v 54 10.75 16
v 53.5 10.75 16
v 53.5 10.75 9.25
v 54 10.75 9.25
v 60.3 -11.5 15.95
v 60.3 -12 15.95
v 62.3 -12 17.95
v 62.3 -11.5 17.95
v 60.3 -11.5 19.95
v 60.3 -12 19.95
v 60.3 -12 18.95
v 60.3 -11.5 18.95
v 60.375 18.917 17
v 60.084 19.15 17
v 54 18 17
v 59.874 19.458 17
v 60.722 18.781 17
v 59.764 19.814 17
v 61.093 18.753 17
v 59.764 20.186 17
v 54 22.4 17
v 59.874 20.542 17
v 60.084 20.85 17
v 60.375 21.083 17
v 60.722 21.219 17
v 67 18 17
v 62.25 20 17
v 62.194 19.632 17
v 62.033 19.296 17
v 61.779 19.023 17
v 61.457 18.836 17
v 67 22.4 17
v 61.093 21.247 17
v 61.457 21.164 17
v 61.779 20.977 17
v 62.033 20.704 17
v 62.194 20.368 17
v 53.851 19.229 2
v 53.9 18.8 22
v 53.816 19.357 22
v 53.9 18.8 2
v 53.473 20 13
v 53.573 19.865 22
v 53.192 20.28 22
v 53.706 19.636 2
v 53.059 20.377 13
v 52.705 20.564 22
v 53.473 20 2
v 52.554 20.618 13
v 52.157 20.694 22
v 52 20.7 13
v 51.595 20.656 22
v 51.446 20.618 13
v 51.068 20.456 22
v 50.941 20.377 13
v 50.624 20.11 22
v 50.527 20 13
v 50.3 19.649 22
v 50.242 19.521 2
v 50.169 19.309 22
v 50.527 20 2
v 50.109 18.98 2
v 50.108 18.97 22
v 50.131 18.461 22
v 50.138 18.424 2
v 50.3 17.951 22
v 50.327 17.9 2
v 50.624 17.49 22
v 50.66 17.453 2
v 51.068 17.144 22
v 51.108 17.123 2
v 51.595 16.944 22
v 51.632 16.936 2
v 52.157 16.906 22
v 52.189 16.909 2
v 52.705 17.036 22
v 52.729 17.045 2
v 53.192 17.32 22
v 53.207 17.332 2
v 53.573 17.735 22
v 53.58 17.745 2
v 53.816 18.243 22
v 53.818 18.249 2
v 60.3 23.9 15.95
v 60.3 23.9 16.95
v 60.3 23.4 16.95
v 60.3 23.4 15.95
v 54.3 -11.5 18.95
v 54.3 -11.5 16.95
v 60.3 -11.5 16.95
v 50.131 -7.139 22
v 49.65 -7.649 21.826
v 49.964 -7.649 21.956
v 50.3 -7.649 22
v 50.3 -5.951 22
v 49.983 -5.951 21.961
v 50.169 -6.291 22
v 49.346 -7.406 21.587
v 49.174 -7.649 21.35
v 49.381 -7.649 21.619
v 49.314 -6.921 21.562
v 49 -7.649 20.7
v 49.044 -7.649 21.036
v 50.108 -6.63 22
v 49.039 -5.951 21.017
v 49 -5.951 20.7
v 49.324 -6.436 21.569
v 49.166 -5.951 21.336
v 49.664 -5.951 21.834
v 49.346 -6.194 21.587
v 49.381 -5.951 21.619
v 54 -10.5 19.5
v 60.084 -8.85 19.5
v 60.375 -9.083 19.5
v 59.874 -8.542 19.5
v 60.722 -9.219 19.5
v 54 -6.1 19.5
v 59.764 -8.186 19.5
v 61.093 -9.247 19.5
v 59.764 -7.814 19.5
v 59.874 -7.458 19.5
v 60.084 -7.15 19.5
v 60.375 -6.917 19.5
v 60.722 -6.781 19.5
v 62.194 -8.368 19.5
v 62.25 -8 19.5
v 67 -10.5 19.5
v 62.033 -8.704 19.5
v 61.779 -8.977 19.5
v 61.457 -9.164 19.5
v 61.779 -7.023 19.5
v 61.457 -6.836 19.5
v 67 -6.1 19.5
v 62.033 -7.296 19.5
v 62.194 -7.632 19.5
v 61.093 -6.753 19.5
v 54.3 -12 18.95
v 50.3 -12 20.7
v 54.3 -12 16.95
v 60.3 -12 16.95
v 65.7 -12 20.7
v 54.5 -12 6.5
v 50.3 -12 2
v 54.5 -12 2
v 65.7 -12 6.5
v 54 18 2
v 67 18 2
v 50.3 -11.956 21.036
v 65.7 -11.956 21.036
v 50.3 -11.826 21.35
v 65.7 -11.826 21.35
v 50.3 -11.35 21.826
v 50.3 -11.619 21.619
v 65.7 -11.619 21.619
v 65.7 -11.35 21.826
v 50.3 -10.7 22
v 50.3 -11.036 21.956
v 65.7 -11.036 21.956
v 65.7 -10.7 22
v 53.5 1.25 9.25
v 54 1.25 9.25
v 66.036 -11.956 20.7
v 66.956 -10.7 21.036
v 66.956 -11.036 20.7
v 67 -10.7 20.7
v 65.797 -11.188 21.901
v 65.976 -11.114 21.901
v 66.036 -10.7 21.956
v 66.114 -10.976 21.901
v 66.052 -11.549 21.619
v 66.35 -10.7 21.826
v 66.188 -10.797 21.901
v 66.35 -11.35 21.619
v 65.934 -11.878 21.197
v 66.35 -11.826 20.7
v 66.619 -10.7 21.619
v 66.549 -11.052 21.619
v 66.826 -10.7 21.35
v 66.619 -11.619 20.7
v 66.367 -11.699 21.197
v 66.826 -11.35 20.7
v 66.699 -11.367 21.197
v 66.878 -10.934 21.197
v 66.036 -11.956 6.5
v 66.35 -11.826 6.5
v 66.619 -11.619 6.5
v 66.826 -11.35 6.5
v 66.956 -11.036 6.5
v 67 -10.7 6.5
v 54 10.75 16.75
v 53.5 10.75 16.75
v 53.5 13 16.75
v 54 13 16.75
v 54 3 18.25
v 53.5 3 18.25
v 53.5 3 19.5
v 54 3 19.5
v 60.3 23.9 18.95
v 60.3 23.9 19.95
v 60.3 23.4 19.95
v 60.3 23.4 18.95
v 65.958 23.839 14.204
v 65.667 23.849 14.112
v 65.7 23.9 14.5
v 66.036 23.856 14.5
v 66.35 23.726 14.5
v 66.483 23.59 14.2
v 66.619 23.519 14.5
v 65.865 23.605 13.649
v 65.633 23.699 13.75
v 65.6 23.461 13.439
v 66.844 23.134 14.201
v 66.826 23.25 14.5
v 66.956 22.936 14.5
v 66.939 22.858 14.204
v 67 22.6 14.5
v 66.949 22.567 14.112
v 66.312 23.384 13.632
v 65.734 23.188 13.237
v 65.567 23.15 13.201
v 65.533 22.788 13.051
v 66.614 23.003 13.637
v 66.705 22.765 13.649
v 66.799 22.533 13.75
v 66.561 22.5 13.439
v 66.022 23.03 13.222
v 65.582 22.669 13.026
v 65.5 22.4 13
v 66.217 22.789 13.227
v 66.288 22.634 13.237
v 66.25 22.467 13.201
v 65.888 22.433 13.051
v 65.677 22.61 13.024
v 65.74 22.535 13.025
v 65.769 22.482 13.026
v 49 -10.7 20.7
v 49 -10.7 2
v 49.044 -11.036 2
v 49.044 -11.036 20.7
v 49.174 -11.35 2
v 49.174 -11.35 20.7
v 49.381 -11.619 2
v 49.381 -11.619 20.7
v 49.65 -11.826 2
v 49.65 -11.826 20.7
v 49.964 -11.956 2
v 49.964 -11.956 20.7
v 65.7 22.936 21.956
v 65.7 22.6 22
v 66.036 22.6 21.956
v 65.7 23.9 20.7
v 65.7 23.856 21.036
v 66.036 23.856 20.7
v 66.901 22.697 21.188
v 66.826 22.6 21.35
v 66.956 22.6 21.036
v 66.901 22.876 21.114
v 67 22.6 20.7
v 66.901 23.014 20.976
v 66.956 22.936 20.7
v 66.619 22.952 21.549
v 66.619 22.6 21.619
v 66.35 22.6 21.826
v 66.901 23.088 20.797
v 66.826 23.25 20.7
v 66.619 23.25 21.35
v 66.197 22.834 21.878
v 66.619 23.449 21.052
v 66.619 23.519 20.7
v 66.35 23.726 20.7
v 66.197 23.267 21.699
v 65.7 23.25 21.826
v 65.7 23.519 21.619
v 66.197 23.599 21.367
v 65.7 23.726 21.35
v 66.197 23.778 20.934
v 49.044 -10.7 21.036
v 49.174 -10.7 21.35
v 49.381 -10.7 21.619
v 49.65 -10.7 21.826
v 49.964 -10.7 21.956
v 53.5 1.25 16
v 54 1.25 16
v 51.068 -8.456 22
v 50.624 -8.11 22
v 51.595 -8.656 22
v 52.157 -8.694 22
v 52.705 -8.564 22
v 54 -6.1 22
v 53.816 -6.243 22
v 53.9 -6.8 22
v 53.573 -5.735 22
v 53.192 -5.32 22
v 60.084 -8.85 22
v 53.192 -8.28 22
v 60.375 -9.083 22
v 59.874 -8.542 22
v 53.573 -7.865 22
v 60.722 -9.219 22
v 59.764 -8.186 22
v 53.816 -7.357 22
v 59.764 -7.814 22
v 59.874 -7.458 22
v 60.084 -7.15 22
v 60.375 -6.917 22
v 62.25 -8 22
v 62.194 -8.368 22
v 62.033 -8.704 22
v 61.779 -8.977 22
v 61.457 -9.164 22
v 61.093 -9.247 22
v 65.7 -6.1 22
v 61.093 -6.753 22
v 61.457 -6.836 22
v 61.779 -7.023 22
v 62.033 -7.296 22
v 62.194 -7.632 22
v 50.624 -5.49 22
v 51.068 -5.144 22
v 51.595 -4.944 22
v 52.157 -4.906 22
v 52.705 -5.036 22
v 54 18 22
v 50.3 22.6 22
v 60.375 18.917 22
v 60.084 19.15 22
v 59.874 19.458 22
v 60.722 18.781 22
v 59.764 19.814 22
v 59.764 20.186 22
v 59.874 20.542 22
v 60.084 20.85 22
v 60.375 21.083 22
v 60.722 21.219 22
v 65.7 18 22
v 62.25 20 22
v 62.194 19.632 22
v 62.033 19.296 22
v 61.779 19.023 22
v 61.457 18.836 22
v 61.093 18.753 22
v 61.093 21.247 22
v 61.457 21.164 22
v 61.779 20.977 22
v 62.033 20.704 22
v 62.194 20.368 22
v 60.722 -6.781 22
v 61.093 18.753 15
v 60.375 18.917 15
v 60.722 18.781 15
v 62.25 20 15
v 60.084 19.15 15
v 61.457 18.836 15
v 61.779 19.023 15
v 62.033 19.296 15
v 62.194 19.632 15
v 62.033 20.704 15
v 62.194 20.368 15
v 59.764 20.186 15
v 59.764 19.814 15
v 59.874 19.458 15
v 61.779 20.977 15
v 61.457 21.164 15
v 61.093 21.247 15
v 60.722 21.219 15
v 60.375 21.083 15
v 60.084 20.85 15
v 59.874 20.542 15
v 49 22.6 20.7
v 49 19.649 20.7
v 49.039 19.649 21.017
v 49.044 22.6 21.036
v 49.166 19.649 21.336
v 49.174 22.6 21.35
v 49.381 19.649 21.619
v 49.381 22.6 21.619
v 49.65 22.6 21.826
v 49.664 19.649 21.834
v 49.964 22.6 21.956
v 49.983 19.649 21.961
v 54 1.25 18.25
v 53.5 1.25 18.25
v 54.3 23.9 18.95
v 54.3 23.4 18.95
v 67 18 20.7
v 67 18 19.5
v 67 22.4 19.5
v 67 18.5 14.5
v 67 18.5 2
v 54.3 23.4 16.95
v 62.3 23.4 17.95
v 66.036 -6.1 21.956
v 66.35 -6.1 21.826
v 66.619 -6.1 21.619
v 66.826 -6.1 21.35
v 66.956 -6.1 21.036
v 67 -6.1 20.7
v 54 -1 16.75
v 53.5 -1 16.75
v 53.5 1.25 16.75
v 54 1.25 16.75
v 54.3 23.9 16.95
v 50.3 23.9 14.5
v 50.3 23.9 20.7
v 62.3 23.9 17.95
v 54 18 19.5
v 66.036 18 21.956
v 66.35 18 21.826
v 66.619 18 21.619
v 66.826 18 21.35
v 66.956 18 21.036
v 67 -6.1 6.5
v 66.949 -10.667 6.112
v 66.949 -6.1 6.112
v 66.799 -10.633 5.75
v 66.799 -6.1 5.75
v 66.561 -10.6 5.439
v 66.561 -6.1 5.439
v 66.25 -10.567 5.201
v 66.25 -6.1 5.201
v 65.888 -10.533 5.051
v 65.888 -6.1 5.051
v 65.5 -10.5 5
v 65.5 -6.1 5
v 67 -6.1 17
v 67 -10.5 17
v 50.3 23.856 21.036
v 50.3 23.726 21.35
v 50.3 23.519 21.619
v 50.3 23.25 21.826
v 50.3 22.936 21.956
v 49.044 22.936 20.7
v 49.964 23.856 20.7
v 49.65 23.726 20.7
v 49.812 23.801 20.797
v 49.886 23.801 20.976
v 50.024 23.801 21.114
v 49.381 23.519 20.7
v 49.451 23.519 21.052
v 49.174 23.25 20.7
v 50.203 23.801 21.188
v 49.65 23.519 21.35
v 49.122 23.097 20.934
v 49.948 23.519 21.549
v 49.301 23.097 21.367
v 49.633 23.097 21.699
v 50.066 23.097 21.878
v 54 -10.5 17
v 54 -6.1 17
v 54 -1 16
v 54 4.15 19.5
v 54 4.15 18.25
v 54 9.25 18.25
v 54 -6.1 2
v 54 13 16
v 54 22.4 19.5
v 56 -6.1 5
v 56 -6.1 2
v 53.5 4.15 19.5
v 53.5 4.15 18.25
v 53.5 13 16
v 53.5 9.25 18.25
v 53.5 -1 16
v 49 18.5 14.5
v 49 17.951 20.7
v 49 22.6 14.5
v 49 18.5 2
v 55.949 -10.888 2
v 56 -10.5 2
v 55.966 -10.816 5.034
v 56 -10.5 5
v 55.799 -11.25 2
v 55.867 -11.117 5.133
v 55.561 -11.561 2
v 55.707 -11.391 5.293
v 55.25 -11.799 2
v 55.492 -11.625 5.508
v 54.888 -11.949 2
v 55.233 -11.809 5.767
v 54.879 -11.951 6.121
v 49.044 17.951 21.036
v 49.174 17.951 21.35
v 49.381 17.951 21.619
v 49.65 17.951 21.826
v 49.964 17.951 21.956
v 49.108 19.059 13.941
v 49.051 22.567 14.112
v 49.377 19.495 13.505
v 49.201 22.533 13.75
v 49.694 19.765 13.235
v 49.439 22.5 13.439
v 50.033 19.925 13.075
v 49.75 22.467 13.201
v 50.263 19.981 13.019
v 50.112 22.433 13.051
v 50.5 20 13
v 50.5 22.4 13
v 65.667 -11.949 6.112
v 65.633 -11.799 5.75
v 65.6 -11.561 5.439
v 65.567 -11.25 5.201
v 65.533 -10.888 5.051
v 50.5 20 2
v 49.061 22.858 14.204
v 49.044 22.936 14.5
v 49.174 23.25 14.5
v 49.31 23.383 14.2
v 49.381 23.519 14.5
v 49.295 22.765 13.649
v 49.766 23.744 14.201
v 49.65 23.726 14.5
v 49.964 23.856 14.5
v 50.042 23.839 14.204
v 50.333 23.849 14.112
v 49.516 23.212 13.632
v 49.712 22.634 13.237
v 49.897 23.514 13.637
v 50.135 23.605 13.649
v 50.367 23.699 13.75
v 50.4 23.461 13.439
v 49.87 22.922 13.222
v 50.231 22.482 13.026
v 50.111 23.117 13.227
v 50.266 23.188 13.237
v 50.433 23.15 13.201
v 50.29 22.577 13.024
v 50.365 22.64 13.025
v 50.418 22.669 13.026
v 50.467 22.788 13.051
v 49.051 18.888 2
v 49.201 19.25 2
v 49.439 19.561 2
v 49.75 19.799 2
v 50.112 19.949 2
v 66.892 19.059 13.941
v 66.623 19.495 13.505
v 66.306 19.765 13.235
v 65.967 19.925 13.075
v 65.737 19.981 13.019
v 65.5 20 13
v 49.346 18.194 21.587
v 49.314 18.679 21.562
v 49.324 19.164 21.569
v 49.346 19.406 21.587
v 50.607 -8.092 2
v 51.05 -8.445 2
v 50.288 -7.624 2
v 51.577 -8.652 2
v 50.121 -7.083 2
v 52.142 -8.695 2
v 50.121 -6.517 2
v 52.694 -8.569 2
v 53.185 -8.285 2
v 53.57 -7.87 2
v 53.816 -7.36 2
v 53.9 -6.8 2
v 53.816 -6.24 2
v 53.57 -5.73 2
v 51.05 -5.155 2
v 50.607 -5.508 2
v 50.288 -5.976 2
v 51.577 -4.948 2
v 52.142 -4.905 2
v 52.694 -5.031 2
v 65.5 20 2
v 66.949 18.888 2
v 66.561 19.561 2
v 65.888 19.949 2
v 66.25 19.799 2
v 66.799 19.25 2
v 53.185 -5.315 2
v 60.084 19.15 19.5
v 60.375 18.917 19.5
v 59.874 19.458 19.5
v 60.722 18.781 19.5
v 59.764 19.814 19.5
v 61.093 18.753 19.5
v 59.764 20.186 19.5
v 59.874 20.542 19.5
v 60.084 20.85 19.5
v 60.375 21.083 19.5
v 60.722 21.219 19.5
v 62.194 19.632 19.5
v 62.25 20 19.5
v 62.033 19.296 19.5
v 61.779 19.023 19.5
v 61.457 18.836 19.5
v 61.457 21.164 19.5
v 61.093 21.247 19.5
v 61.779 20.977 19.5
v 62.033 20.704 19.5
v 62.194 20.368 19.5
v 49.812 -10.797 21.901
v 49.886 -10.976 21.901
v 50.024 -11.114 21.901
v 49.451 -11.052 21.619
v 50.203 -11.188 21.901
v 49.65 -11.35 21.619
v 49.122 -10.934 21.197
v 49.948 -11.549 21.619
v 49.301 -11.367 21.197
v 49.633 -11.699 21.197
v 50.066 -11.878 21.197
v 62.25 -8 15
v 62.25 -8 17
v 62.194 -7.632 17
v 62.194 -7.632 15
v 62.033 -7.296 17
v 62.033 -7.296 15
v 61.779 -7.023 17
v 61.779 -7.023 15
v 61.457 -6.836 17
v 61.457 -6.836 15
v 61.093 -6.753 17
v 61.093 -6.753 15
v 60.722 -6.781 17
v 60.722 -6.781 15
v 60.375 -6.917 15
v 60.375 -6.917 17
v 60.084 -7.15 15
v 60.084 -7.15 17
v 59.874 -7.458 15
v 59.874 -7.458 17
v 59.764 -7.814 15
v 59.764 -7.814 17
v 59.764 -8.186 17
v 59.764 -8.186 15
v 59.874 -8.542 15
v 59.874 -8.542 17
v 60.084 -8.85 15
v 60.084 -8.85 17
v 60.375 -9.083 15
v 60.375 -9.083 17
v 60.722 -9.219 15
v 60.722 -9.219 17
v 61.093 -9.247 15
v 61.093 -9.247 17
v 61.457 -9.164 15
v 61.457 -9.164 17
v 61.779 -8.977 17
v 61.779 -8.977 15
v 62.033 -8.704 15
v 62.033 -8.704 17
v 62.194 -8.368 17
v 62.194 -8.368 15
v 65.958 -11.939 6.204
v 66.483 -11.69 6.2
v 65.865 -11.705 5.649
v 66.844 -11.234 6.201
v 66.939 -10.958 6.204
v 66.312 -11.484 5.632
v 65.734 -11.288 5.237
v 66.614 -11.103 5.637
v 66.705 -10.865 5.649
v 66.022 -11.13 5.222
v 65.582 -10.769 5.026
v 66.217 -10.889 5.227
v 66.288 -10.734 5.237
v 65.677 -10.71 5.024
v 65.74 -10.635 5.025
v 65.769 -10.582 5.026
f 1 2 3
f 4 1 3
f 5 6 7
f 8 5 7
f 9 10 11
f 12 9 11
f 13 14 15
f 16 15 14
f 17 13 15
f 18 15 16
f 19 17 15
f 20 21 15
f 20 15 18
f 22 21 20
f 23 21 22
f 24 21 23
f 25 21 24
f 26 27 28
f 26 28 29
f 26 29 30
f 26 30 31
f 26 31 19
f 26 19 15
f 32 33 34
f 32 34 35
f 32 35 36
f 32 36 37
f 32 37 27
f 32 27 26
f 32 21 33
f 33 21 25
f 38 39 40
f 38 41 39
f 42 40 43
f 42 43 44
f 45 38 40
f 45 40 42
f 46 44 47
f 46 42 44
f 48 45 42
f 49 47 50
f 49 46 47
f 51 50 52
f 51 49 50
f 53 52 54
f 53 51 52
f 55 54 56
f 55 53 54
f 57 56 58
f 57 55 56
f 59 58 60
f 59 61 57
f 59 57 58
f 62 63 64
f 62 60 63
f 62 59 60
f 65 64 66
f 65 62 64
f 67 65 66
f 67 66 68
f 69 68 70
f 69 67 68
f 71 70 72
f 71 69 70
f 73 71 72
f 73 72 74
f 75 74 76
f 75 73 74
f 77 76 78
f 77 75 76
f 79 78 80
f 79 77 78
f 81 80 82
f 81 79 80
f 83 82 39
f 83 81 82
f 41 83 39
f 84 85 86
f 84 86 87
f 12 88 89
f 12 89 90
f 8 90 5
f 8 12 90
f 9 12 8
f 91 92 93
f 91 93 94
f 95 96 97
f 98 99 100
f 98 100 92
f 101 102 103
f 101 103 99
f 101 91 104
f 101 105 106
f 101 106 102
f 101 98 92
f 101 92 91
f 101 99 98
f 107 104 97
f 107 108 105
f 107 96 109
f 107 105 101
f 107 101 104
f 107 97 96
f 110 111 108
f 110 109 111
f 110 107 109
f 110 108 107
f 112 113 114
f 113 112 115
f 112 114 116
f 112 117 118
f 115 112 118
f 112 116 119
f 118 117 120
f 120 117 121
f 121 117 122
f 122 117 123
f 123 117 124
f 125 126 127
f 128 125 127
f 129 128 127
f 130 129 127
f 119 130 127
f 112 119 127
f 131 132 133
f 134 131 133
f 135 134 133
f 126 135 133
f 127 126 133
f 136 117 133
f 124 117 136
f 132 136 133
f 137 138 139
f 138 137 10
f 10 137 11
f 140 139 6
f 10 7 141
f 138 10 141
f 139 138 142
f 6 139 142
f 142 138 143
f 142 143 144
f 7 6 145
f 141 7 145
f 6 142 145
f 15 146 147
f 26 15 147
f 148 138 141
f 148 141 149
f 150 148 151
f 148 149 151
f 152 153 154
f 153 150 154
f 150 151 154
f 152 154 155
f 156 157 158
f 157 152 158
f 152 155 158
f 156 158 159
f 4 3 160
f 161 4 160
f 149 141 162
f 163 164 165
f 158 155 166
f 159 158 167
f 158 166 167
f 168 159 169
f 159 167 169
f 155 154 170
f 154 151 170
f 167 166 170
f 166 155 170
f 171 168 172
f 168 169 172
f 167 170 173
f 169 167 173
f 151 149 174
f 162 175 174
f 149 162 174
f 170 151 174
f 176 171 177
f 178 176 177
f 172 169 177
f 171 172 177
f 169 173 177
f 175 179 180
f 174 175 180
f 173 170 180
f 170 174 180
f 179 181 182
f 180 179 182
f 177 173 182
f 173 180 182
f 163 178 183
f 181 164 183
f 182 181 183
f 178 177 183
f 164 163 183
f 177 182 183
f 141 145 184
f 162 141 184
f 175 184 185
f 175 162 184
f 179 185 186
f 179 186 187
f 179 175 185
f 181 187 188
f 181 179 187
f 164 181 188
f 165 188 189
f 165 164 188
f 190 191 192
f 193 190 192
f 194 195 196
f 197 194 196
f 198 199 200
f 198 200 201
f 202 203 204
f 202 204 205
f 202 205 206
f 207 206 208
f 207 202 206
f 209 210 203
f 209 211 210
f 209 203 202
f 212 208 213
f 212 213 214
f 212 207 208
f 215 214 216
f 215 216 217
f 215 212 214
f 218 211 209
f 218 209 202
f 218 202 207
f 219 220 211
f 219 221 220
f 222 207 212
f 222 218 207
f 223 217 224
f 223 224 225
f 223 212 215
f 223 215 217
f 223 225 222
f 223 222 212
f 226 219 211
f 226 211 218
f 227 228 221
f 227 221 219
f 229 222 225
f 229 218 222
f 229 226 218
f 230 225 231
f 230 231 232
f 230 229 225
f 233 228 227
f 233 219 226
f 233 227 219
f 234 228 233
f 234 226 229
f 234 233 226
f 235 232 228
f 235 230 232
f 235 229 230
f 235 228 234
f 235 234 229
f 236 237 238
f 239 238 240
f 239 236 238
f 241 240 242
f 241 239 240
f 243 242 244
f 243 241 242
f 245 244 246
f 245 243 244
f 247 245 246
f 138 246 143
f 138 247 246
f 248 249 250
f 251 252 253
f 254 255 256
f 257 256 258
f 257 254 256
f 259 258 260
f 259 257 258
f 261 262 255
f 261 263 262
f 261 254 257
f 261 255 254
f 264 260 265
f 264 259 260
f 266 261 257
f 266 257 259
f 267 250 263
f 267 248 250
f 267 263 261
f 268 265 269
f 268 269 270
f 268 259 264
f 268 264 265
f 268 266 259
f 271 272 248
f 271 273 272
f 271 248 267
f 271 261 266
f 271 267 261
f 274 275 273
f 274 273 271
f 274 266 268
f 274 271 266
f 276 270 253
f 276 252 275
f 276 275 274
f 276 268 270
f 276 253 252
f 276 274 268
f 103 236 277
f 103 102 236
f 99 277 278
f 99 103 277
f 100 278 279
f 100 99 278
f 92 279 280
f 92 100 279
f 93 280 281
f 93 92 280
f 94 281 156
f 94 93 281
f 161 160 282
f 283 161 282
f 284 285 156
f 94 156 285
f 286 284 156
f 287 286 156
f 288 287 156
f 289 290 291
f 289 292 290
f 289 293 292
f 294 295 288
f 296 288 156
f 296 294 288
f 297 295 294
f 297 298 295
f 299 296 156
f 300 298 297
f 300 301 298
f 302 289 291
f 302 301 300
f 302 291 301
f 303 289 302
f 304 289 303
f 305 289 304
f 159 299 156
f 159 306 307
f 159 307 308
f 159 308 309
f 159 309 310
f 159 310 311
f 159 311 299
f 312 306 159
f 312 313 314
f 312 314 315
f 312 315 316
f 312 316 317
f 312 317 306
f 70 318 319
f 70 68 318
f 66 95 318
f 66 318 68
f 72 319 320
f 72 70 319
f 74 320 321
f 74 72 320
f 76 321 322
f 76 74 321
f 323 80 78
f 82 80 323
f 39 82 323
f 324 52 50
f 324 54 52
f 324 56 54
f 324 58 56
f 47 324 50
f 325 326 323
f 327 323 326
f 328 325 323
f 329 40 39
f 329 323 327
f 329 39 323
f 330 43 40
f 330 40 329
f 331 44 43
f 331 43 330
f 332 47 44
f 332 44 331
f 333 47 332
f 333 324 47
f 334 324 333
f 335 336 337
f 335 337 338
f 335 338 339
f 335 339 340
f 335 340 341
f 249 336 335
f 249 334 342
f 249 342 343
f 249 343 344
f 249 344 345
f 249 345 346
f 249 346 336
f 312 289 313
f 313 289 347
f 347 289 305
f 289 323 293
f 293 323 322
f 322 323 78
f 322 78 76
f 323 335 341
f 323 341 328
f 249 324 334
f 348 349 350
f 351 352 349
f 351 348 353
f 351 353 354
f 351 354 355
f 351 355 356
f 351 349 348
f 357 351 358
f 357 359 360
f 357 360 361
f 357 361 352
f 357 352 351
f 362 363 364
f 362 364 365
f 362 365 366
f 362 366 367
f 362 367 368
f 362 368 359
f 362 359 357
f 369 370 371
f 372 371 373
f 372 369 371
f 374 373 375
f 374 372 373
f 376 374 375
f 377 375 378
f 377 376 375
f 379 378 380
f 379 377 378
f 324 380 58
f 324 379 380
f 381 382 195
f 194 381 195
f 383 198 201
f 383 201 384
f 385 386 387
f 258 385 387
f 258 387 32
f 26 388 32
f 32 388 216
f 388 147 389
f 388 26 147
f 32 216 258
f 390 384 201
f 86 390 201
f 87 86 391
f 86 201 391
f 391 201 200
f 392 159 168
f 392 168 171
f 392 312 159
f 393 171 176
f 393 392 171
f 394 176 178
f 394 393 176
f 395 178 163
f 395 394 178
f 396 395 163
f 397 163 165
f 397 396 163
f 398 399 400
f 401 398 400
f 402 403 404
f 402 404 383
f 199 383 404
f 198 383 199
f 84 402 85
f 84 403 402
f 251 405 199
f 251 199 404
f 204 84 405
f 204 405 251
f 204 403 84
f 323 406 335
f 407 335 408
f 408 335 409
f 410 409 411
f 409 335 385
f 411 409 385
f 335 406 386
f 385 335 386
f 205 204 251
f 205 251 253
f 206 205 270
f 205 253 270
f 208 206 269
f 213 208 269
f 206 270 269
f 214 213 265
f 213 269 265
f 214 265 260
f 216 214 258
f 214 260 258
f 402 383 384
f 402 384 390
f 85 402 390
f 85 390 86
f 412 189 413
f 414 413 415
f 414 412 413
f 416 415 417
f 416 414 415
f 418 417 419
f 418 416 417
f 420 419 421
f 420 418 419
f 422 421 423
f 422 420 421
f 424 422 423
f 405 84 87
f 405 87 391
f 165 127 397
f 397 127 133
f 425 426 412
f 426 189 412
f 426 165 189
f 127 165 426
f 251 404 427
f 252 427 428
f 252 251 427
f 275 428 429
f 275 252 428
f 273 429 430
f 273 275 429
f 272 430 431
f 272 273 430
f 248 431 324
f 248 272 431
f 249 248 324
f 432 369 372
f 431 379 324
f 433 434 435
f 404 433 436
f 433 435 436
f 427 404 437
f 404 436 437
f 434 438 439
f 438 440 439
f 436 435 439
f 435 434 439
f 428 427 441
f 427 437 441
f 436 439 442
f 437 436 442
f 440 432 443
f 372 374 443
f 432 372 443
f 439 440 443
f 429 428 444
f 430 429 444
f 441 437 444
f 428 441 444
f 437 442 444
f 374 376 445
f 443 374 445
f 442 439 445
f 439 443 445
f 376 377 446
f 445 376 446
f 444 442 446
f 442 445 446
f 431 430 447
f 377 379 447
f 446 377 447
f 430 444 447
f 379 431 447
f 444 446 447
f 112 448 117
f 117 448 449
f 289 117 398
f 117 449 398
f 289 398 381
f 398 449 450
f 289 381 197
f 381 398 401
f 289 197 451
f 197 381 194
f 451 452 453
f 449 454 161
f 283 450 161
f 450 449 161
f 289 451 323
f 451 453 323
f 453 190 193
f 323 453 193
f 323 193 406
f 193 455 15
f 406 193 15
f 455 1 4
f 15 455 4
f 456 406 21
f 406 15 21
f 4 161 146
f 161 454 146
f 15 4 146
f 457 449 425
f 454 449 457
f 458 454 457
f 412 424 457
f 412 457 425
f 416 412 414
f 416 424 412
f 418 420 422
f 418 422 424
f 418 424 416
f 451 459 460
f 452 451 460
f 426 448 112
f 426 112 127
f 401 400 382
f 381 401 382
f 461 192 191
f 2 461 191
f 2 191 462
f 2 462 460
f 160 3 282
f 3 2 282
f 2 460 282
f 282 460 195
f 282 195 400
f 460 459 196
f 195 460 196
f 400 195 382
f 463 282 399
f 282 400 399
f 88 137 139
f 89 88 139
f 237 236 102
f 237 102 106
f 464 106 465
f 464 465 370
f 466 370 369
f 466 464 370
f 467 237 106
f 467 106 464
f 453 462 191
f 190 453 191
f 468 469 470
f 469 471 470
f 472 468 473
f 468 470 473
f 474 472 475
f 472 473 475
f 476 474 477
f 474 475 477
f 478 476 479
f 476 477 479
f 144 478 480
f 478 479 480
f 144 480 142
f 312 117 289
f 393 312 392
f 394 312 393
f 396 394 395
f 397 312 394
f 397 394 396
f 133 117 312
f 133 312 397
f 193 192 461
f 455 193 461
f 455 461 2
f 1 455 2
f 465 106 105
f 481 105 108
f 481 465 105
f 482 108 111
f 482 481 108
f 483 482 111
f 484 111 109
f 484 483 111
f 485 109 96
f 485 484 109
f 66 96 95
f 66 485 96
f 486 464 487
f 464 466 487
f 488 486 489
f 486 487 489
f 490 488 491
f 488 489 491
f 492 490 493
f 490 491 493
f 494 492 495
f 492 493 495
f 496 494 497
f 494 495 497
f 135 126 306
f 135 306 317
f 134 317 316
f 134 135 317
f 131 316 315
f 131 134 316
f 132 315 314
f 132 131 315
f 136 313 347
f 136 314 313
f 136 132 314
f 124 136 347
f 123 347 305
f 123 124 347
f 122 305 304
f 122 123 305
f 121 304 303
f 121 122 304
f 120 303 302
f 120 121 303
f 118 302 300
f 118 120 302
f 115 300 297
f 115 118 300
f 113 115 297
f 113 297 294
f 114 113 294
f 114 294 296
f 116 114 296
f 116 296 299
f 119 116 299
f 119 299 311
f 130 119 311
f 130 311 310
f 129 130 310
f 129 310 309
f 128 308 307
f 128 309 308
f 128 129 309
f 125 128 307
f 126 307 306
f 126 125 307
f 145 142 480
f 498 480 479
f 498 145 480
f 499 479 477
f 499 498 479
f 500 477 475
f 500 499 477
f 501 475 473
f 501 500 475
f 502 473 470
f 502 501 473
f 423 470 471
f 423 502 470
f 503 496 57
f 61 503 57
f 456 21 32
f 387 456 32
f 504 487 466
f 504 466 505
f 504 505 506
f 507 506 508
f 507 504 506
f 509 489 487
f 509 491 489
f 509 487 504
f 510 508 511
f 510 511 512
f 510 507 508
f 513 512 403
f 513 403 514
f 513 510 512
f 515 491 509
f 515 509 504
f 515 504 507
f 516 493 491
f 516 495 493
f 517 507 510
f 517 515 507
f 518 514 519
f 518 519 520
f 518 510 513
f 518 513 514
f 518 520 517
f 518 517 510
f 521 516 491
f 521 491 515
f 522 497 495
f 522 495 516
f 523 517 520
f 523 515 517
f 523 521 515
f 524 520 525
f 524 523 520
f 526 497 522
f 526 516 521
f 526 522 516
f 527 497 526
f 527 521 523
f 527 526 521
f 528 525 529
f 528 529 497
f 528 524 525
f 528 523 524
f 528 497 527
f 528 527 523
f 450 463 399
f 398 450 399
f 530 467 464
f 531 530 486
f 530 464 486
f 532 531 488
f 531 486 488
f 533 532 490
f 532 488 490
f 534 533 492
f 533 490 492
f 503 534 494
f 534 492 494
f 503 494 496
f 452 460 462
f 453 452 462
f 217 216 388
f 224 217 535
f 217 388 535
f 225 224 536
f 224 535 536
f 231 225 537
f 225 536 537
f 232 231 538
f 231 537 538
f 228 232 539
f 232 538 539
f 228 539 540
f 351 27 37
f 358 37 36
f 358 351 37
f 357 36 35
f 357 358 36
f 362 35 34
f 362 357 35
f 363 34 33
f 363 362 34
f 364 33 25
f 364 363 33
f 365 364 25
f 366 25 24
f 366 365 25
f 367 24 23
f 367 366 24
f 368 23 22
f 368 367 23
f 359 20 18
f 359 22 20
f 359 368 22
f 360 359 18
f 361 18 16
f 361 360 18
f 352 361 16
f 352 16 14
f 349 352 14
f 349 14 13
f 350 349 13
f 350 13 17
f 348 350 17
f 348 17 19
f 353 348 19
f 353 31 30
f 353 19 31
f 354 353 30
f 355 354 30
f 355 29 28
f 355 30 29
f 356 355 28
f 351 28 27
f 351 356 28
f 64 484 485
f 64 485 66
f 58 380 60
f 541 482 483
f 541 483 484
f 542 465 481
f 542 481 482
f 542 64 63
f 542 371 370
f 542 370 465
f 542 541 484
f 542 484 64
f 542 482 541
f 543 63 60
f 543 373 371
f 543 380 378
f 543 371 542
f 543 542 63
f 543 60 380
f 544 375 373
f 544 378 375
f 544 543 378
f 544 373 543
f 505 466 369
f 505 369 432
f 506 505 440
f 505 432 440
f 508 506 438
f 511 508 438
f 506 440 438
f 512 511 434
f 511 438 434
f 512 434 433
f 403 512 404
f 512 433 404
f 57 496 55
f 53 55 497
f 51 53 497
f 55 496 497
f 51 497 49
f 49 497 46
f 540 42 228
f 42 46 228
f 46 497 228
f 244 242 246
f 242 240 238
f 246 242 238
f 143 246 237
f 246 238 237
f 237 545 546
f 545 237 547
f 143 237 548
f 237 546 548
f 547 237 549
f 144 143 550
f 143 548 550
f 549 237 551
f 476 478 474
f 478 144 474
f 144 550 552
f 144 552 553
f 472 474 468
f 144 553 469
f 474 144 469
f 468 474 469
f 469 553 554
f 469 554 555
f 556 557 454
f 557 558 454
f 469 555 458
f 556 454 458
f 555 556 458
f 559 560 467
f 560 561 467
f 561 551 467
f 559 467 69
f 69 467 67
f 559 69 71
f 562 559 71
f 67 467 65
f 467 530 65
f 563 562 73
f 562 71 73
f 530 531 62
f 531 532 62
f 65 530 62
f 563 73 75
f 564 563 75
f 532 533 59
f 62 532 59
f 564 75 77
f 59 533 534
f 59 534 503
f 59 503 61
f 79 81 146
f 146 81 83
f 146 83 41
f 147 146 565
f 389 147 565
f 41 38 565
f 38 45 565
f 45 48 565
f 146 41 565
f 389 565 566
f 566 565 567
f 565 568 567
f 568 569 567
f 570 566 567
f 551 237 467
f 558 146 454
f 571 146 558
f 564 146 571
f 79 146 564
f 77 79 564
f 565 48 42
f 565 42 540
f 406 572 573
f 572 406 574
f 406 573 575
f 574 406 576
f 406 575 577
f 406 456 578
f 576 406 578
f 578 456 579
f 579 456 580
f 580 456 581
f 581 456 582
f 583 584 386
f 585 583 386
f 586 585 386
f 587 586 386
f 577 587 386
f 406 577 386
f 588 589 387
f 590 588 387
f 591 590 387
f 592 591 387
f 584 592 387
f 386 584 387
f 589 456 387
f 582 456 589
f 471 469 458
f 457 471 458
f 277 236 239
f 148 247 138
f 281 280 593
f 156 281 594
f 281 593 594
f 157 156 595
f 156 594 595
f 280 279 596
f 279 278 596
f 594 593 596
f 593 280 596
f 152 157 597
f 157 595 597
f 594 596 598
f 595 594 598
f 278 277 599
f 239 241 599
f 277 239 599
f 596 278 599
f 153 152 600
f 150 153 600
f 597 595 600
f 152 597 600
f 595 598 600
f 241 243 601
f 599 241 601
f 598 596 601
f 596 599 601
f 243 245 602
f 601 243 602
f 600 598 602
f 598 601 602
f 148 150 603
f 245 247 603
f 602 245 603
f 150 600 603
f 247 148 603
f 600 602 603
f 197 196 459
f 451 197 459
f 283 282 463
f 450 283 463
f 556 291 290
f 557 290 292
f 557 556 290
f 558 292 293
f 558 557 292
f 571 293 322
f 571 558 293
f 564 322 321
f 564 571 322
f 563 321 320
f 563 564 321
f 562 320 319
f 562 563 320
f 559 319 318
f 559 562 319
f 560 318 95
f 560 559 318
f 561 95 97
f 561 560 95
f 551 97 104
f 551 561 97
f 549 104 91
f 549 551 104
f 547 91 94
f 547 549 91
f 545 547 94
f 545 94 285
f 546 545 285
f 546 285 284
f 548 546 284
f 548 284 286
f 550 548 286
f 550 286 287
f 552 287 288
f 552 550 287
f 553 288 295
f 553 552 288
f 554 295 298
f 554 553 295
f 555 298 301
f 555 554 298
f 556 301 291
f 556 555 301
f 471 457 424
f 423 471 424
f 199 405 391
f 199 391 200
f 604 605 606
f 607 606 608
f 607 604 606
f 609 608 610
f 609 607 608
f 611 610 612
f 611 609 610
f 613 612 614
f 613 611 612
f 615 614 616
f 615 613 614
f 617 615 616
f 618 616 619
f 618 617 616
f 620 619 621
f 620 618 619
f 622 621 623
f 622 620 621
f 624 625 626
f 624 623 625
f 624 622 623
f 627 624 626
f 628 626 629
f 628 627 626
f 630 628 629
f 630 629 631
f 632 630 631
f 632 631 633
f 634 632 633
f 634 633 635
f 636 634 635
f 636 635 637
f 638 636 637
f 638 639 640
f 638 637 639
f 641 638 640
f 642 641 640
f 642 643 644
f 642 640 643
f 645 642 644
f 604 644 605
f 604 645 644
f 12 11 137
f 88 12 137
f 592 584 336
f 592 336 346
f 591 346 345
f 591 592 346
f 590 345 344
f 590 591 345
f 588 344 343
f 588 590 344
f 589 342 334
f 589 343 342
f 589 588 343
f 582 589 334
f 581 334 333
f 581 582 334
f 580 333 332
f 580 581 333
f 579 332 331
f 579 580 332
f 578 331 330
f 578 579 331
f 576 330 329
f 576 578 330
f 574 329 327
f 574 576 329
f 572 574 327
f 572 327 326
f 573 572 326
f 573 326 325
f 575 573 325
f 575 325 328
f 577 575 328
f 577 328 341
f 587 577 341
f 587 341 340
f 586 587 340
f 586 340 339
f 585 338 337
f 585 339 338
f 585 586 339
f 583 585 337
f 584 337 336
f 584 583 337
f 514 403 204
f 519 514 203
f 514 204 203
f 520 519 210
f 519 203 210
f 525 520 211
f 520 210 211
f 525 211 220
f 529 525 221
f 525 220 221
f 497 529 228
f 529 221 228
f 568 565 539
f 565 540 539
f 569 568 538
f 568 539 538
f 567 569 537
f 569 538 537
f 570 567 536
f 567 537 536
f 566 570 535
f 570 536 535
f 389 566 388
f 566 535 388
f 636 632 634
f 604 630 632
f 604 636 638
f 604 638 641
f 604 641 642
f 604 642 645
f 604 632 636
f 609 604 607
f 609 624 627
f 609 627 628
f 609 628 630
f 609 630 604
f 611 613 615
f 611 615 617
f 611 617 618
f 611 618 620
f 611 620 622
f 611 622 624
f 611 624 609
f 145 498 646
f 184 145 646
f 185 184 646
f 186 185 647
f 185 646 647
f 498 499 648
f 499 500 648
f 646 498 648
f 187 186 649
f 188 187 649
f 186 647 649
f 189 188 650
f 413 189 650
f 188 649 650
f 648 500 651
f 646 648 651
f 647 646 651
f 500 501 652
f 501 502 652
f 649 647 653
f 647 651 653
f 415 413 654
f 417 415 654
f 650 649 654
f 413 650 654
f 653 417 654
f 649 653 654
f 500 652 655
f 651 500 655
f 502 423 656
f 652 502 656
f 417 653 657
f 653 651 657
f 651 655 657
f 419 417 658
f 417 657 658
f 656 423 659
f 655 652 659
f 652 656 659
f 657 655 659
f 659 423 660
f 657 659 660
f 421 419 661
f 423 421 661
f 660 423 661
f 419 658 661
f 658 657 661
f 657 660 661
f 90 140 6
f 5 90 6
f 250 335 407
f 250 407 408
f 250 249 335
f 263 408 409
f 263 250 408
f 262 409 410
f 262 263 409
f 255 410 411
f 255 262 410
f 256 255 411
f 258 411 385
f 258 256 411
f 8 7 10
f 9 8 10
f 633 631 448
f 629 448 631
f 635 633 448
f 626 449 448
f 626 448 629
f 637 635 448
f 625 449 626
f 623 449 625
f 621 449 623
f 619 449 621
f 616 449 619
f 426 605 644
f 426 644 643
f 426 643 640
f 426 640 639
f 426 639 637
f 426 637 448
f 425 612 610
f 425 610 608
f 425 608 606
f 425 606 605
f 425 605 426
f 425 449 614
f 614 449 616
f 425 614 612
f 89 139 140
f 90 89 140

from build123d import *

# Parameters (mm, degrees)
PAD015_DEPTH      = 0.5
BOX039_W          = 18
BOX039_H          = 10
BOX039_DEPTH      = 11
BOX038_W          = 14
BOX038_H          = 10
BOX038_DEPTH      = 10
CYLINDER036_R     = 1.25
CYLINDER036_DEPTH = 8
CYLINDER037_R     = 1.25
CYLINDER037_DEPTH = 8
CYLINDER014_R     = 1.9
CYLINDER014_DEPTH = 20
CYLINDER015_R     = 1.9
CYLINDER015_DEPTH = 20
BOX015_W          = 13
BOX015_H          = 4.9
BOX015_DEPTH      = 2.5
BOX035_W          = 13
BOX035_H          = 24.1
BOX035_DEPTH      = 20
BOX014_W          = 13
BOX014_H          = 4.9
BOX014_DEPTH      = 2.5
BOX016_W          = 18
BOX016_H          = 35.9
BOX016_DEPTH      = 20
FILLET008_R       = 1.3
FILLET010_R       = 1.5
POCKET020_DEPTH   = 0.5
POCKET021_DEPTH   = 0.5


with BuildPart() as pad015:
    # Sketch046 → Pad015 (new body)
    with BuildSketch(Plane(origin=(53.5, 6, 2.5), x_dir=(0, 1, 0), z_dir=(1, 0, 0))):
        Polygon((4.75, 6.75), (-4.75, 6.75), (-4.75, 13.5), (-7, 13.5), (-7, 14.25), (-4.75, 14.25), (-4.75, 15.75), (-3, 15.75), (-3, 17), (-1.85, 17), (-1.85, 15.75), (3.25, 15.75), (4.75, 14.25), (7, 14.25), (7, 13.5), (4.75, 13.5), align=None)
    extrude(amount=PAD015_DEPTH)


with BuildPart() as hueco_conector_miniservo:
    # Box039 → Box039 (new body)
    with BuildSketch(Plane(origin=(49, 20, 3), x_dir=(1, 0, 0), z_dir=(0, 0, 1))):
        with Locations((9, 5)):
            Rectangle(BOX039_W, BOX039_H)
    extrude(amount=BOX039_DEPTH)


with BuildPart() as hueco_cables_miniservo:
    # Box038 → Box038 (new body)
    with BuildSketch(Plane(origin=(57, -14, -4), x_dir=(1, 0, 0), z_dir=(0, 0, 1))):
        with Locations((7, 5)):
            Rectangle(BOX038_W, BOX038_H)
    extrude(amount=BOX038_DEPTH)


with BuildPart() as cylinder036:
    # Cylinder036 → Cylinder036 (new body)
    with BuildSketch(Plane(origin=(57, -106, 14), x_dir=(1, 0, 0), z_dir=(0, 0, 1))):
        Circle(CYLINDER036_R)
    extrude(amount=CYLINDER036_DEPTH)


with BuildPart() as fusion036:
    # Cylinder037 → Cylinder037 (new body)
    with BuildSketch(Plane(origin=(57, -134, 14), x_dir=(1, 0, 0), z_dir=(0, 0, 1))):
        Circle(CYLINDER037_R)
    extrude(amount=CYLINDER037_DEPTH)

    # Fusion036: union Cylinder036
    add(cylinder036.part)


with BuildPart() as cylinder014:
    # Cylinder014 → Cylinder014 (new body)
    with BuildSketch(Plane(origin=(48, -132.8, 1), x_dir=(1, 0, 0), z_dir=(0, 0, 1))):
        Circle(CYLINDER014_R)
    extrude(amount=CYLINDER014_DEPTH)


with BuildPart() as fusion035:
    # Cylinder015 → Cylinder015 (new body)
    with BuildSketch(Plane(origin=(48, -107.2, 1), x_dir=(1, 0, 0), z_dir=(0, 0, 1))):
        Circle(CYLINDER015_R)
    extrude(amount=CYLINDER015_DEPTH)

    # Fusion035: union Cylinder014
    add(cylinder014.part)


with BuildPart() as box015:
    # Box015 → Box015 (new body)
    with BuildSketch(Plane(origin=(50, -108.5, 16), x_dir=(1, 0, 0), z_dir=(0, 0, 1))):
        with Locations((6.5, 2.45)):
            Rectangle(BOX015_W, BOX015_H)
    extrude(amount=BOX015_DEPTH)


with BuildPart() as hueco_miniservo:
    # Box035 → Box035 (new body)
    with BuildSketch(Plane(origin=(50, -132.1, 1), x_dir=(1, 0, 0), z_dir=(0, 0, 1))):
        with Locations((6.5, 12.05)):
            Rectangle(BOX035_W, BOX035_H)
    extrude(amount=BOX035_DEPTH)


with BuildPart() as fusion034:
    # Box014 → Box014 (new body)
    with BuildSketch(Plane(origin=(50, -136.5, 16), x_dir=(1, 0, 0), z_dir=(0, 0, 1))):
        with Locations((6.5, 2.45)):
            Rectangle(BOX014_W, BOX014_H)
    extrude(amount=BOX014_DEPTH)

    # Fusion034: union Box015, Hueco_Miniservo
    add(box015.part)
    add(hueco_miniservo.part)


with BuildPart() as sujeta_miniservo_final:
    # Box016 → Box016 (new body)
    with BuildSketch(Plane(origin=(45, -138, 1), x_dir=(1, 0, 0), z_dir=(0, 0, 1))):
        with Locations((9, 17.95)):
            Rectangle(BOX016_W, BOX016_H)
    extrude(amount=BOX016_DEPTH)

    # Cut012: cut Fusion034
    add(fusion034.part, mode=Mode.SUBTRACT)

    # Cut013: cut Fusion035
    add(fusion035.part, mode=Mode.SUBTRACT)

    # Cut016: cut Fusion036
    add(fusion036.part, mode=Mode.SUBTRACT)

    # Fillet008
    fillet008_edges = [sujeta_miniservo_final.edges().sort_by_distance(p)[0] for p in [
        (45, -138, 11),
        (45, -120.05, 21),
        (45, -102.1, 11),
        (63, -138, 11),
        (54, -138, 21),
        (54, -102.1, 21),
        (63, -105.05, 21),
        (63, -135.05, 21),
        (63, -102.1, 11),
    ]]
    fillet(fillet008_edges, radius=FILLET008_R)


with BuildPart() as sujeta_miniservo_final_1:
    # Fillet008 placement: moved
    add(sujeta_miniservo_final.part.moved(Location((5, 126, 2))))

    # Cut017: cut Hueco_Cables_Miniservo
    add(hueco_cables_miniservo.part, mode=Mode.SUBTRACT)


with BuildPart() as sujeta_miniservo_final_2:
    # Cut017 placement: moved
    add(sujeta_miniservo_final_1.part.moved(Location((-1, 0, 0))))

    # Cut019: cut Hueco_Conector_Miniservo
    add(hueco_conector_miniservo.part, mode=Mode.SUBTRACT)

    # Fillet010
    fillet010_edges = [sujeta_miniservo_final_2.edges().sort_by_distance(p)[0] for p in [
        (49, 21.3, 14),
        (49, 20, 8.5),
        (49.380761, 23.519239, 14),
        (58, 23.9, 14),
        (66.619239, 23.519239, 14),
        (67, 21.3, 14),
        (56, -12, 4.5),
        (60.85, -12, 6),
        (67, 20, 8.5),
        (67, -8.4, 6),
        (66.619239, -11.619239, 6),
    ]]
    fillet(fillet010_edges, radius=FILLET010_R)


with BuildPart() as sujeta_miniservo_final_3:
    # Fillet010 placement: moved
    add(sujeta_miniservo_final_2.part.moved(Location((0, 0, -1))))

    # Sketch044 → Pocket020 (cut)
    with BuildSketch(Plane(origin=(0, -12, -1), x_dir=(1, 0, 0), z_dir=(0, -1, 0))):
        Polygon((54.3, 19.95), (54.3, 17.95), (60.3, 17.95), (60.3, 16.95), (62.3, 18.95), (60.3, 20.95), (60.3, 19.95), align=None)
    extrude(amount=-POCKET020_DEPTH, mode=Mode.SUBTRACT)

    # Sketch045 → Pocket021 (cut)
    with BuildSketch(Plane(origin=(0, 23.9, -1), x_dir=(-1, 0, 0), z_dir=(0, 1, 0))):
        Polygon((-60.3, 19.95), (-54.3, 19.95), (-54.3, 17.95), (-60.3, 17.95), (-60.3, 16.95), (-62.3, 18.95), (-60.3, 20.95), align=None)
    extrude(amount=-POCKET021_DEPTH, mode=Mode.SUBTRACT)

    # Cut056: cut Pad015
    add(pad015.part, mode=Mode.SUBTRACT)


solid = sujeta_miniservo_final_3.part
